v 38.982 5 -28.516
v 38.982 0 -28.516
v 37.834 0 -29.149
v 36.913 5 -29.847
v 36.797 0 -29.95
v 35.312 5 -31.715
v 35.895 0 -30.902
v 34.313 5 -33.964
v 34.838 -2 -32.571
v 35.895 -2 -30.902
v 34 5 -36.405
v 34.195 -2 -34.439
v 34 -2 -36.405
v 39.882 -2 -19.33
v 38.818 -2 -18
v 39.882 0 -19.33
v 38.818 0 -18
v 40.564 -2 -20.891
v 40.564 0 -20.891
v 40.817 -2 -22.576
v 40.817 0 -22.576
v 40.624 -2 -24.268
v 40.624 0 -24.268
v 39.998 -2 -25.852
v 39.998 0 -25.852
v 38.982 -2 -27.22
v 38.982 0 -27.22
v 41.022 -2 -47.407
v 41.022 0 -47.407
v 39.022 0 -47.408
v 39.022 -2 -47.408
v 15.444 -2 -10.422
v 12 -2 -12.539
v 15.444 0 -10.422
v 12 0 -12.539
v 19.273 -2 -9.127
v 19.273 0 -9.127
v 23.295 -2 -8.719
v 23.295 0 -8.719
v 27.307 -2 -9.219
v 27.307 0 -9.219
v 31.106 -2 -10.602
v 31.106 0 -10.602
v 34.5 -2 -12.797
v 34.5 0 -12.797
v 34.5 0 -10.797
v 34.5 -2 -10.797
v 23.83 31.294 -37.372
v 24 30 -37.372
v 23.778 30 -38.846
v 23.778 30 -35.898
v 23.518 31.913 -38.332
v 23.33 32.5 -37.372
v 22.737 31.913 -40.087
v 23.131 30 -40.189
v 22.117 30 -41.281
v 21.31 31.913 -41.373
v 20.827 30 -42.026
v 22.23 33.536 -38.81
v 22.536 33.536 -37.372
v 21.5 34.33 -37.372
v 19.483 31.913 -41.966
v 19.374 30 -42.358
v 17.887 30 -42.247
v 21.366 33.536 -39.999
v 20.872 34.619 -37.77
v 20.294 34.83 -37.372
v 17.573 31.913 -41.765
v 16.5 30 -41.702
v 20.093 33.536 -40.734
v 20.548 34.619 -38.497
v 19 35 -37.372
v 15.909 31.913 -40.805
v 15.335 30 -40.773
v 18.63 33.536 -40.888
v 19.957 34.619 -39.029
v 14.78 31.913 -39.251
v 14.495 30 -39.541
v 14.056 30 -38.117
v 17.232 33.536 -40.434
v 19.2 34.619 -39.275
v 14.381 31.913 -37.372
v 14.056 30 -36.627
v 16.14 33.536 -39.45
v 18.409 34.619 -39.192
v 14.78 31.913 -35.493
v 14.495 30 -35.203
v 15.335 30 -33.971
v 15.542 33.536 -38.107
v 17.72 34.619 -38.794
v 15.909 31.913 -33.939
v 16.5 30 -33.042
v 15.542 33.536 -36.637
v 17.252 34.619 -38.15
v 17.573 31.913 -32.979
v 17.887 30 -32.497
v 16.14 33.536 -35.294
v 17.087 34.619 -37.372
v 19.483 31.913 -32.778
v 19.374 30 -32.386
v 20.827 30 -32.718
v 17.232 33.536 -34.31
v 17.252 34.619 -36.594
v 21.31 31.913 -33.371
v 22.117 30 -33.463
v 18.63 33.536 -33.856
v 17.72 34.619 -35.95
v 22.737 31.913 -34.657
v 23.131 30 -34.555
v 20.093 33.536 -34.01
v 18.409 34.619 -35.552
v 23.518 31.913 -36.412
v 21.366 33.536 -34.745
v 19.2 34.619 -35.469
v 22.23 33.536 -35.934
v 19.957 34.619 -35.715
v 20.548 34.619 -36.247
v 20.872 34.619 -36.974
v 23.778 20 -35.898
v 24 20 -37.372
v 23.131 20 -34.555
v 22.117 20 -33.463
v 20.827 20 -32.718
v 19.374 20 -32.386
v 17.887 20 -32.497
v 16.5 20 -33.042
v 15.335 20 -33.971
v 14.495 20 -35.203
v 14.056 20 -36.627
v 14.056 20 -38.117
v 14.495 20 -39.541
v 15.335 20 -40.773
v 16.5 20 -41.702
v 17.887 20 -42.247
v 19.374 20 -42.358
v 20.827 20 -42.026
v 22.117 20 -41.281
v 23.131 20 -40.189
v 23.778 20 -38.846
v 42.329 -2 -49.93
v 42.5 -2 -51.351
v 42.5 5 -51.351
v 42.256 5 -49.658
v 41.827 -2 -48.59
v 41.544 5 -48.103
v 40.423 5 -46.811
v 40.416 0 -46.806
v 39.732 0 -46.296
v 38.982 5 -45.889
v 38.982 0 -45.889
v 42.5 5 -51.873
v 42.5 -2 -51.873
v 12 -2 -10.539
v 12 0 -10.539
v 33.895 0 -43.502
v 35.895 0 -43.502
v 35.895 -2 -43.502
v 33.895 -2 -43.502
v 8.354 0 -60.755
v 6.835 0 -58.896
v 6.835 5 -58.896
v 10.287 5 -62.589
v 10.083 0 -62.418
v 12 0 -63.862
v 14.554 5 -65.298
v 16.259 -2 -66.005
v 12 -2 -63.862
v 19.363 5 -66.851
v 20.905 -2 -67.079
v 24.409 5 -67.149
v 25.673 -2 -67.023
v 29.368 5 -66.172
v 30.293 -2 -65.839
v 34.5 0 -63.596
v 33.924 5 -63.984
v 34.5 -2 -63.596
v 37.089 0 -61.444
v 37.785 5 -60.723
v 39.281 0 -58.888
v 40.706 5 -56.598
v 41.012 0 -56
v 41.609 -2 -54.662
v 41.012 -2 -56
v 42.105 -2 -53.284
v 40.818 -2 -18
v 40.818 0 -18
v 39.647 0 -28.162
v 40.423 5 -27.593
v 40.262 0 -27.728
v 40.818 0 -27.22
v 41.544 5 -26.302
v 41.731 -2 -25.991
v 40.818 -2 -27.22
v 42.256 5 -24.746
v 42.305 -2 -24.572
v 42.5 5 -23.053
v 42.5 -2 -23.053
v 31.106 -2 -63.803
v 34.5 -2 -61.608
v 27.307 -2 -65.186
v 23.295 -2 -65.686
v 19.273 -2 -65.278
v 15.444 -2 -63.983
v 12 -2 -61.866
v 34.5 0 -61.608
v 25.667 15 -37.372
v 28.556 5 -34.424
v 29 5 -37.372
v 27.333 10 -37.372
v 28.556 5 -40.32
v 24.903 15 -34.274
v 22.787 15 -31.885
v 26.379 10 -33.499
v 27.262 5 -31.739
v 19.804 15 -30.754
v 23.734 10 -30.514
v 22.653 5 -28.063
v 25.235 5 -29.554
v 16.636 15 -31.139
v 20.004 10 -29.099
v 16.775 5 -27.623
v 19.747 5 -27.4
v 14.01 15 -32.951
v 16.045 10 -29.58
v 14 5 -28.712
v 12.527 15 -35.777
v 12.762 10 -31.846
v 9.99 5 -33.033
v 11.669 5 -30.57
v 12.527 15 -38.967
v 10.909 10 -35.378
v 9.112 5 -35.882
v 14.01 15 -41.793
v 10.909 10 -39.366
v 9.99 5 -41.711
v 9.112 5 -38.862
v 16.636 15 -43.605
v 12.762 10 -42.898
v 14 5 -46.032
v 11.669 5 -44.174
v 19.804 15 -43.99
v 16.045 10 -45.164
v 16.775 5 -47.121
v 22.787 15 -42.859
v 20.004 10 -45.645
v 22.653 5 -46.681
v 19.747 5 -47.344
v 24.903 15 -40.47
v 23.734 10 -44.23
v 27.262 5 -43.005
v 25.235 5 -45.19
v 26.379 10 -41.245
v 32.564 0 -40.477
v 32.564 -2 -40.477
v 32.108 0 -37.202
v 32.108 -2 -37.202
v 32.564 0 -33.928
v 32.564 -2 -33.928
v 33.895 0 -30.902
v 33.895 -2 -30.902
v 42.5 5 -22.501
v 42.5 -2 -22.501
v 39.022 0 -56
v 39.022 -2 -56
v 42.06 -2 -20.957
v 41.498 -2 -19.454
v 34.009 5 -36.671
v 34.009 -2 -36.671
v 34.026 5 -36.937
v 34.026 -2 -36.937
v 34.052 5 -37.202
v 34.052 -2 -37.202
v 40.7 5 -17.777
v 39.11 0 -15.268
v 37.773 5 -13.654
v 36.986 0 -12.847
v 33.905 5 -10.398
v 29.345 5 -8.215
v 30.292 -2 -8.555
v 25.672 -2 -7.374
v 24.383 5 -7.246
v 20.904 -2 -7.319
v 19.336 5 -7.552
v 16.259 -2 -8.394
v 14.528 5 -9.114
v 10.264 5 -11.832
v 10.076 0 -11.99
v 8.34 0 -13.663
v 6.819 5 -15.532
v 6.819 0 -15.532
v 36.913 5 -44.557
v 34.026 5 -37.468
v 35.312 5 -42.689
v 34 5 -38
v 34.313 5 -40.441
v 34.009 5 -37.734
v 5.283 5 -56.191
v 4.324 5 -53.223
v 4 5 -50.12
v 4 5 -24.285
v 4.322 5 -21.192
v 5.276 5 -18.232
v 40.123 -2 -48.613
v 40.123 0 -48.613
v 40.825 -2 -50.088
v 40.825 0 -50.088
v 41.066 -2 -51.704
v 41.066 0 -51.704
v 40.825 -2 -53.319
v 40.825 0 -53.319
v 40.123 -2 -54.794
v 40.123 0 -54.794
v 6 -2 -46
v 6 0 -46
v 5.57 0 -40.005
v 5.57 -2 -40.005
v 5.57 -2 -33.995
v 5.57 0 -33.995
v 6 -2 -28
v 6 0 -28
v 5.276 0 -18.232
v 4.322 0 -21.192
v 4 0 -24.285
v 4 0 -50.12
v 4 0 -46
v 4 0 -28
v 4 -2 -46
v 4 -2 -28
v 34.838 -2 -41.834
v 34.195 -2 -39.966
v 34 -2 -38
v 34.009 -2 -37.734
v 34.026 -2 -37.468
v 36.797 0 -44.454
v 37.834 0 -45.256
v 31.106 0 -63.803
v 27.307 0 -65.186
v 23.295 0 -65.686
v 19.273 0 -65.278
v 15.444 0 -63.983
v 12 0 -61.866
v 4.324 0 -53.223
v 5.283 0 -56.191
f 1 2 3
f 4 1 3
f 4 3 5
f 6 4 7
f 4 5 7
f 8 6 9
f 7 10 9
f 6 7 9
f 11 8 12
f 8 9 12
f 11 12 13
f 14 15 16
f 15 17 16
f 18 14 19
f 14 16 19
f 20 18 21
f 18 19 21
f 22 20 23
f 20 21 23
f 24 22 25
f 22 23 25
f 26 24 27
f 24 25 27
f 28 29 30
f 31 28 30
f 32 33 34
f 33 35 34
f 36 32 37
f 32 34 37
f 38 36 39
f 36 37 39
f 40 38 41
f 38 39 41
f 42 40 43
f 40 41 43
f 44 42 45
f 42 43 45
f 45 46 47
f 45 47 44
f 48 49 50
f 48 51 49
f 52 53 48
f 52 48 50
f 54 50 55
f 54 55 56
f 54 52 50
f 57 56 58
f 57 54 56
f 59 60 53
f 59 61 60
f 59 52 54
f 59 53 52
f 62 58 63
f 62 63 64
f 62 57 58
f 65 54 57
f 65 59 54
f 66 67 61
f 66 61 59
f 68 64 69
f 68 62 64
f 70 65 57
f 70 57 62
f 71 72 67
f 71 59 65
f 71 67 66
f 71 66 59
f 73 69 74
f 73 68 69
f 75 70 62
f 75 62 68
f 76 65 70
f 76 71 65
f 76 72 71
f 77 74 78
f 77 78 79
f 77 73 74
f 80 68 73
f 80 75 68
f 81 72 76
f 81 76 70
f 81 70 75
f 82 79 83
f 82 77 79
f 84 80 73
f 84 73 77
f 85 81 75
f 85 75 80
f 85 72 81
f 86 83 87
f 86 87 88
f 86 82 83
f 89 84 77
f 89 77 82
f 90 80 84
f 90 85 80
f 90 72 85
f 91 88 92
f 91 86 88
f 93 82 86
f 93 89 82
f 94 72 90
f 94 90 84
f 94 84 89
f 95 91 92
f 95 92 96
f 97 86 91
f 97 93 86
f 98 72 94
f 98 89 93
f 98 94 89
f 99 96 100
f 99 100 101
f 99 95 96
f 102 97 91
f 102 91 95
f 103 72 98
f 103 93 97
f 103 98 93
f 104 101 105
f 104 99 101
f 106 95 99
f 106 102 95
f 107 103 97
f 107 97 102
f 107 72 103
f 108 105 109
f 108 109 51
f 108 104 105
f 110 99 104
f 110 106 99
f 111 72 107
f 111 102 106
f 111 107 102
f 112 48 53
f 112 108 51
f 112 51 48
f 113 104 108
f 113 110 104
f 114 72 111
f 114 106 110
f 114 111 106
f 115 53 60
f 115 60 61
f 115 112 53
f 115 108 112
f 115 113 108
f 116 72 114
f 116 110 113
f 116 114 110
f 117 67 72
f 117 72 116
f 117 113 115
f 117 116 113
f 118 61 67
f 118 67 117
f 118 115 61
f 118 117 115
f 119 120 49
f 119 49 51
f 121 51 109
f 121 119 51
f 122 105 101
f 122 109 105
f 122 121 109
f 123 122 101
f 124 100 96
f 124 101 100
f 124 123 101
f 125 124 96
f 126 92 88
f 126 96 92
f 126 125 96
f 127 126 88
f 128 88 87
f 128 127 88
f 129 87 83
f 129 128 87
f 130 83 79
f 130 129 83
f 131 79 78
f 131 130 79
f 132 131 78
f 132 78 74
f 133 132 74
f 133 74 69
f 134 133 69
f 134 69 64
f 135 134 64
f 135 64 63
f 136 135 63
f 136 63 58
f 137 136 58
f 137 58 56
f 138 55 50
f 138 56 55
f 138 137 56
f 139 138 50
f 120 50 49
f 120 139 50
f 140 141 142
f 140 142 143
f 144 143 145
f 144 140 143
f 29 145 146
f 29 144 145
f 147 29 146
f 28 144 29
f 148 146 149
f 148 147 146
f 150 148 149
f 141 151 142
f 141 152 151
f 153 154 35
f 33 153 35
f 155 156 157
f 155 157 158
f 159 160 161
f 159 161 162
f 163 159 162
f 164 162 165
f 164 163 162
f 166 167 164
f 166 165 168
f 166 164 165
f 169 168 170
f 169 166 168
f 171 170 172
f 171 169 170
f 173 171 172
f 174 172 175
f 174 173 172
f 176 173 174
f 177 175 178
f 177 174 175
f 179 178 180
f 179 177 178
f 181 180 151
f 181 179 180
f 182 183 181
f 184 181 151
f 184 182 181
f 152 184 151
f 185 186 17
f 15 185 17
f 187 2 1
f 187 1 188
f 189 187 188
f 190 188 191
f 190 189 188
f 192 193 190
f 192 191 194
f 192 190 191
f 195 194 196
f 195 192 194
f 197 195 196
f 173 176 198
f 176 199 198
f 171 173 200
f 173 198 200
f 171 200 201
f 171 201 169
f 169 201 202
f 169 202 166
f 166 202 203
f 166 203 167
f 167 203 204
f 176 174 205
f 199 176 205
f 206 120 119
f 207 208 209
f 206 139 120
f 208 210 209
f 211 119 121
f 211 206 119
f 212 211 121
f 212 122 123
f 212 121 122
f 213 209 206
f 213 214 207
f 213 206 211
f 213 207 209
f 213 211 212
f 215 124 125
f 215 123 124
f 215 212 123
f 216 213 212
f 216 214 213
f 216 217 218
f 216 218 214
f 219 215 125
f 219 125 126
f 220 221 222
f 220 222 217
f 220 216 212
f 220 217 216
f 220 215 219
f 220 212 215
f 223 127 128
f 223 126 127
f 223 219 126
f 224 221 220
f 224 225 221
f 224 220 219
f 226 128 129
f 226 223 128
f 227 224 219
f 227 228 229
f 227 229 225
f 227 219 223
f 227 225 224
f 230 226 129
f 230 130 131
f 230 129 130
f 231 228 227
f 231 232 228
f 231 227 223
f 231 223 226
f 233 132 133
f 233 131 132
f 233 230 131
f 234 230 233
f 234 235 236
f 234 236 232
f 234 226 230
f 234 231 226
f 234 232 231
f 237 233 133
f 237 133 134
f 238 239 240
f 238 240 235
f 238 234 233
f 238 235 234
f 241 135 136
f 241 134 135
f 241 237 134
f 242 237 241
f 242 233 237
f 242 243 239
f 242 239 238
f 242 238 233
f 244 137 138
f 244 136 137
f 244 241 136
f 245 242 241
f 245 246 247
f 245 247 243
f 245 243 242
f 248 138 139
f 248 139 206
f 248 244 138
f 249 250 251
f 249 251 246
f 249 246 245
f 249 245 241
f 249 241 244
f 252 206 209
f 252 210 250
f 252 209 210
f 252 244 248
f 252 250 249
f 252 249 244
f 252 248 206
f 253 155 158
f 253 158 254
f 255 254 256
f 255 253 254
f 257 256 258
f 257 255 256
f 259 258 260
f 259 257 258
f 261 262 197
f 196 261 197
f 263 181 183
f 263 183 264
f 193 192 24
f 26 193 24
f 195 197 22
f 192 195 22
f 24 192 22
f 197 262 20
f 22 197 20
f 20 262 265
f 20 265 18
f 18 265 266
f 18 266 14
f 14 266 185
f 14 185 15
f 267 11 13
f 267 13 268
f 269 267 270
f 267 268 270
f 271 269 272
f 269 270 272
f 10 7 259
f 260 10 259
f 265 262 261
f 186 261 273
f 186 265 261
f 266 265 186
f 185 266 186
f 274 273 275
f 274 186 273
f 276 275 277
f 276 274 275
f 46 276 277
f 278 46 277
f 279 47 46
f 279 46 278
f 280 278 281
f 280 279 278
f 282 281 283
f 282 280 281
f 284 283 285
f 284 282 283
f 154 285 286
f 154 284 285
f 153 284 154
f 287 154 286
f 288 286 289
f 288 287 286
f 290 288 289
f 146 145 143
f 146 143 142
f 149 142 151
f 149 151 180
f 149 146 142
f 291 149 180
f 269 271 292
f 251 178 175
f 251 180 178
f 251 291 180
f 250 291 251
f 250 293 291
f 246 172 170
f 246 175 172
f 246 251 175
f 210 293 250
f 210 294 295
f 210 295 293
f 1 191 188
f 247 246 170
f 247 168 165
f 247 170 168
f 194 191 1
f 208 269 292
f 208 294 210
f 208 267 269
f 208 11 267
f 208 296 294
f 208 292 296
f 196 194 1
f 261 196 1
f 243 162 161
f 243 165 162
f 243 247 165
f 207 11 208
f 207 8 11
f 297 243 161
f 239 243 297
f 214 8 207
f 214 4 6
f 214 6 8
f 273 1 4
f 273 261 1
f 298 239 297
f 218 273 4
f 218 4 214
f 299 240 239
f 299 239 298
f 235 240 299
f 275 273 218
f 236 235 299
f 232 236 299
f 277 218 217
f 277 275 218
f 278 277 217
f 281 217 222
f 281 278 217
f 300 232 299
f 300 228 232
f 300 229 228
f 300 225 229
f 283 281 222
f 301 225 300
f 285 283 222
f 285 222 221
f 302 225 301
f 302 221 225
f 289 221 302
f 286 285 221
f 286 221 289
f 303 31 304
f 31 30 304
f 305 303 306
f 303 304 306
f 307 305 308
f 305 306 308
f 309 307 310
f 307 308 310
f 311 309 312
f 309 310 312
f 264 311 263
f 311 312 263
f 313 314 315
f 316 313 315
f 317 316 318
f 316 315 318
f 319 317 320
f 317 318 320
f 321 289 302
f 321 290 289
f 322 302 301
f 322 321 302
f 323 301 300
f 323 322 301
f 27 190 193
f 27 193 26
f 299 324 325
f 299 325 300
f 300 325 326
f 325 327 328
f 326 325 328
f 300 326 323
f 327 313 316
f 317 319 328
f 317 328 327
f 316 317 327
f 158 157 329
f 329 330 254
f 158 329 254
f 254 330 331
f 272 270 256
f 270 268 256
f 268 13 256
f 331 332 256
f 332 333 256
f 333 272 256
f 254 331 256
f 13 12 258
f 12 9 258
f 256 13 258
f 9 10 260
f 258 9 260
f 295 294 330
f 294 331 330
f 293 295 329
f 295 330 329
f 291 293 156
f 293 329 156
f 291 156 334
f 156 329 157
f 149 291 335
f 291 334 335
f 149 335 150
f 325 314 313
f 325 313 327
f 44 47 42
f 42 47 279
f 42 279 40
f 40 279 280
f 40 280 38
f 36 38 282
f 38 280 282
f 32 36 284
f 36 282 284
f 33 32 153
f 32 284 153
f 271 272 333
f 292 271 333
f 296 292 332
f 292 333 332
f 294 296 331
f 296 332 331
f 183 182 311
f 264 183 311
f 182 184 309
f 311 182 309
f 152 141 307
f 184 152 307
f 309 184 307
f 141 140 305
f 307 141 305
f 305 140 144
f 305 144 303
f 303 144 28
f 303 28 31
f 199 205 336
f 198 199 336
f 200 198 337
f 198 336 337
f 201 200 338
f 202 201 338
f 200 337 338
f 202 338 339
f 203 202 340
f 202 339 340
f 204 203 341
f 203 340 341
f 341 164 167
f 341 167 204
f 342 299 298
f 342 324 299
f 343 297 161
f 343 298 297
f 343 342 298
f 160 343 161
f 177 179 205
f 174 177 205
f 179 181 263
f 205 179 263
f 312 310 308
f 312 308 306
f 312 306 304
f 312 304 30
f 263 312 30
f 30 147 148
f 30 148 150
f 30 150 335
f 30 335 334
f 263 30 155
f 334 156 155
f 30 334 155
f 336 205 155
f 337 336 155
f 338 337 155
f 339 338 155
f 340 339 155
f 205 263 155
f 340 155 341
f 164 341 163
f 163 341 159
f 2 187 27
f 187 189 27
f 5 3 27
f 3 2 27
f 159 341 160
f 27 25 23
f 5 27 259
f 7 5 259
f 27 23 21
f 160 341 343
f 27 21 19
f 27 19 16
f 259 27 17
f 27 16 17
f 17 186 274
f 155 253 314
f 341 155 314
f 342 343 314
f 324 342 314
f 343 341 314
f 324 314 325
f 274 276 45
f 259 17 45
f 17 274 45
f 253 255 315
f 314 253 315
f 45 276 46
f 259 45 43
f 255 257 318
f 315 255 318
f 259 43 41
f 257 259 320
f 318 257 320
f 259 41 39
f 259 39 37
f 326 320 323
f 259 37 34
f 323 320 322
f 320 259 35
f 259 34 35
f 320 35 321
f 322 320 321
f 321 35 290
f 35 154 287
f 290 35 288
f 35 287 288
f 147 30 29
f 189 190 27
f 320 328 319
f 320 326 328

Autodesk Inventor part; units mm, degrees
ref_plane "YZ Plane" through (0, 0, 0) normal (1, 0, 0) x (0, 1, 0)
ref_plane "XZ Plane" through (0, 0, 0) normal (0, 1, 0) x (-1, 0, 0)
sketch "Szkic1" plane through (0, 0, 0) normal (0, 1, 0) x (-1, 0, 0)
  line L0 (-4, -50.1202) -> (-4, -37.2024)
  line L1 (-42.5, -51.8732) -> (-42.5, -51.3513)
  line L2 (-4, -38) -> (-4, -50.1202)
  arc A0 (-38.9822, -45.8888) -> (-34, -38.0004) centre (-42.4987, -38.1503) ccw
  line L3 (-42.5, -51.3513) -> (-42.5, -51.8732)
  arc A1 (-34, -38.0004) -> (-34.0517, -37.2023) centre (-42.4987, -38.1503) ccw
  arc A2 (-38.9822, -45.8888) -> (-42.5, -51.3513) centre (-36.5, -51.3513) ccw
  arc A3 (-42.5, -51.8732) -> (-6.8354, -58.8964) centre (-23.0549, -47.1948) ccw
  arc A4 (-6.8354, -58.8964) -> (-4, -50.1202) centre (-19, -50.1202) ccw
  line L4 (-42.5, -51.3513) -> (-42.5, -51.8732)
  line L5 (-4, -24.2847) -> (-4, -37.2024)
  line L6 (-42.5, -22.5011) -> (-42.5, -23.0533)
  line L7 (-4, -36.4049) -> (-4, -24.2847)
  arc A5 (-34, -36.4047) -> (-38.9822, -28.5157) centre (-42.4987, -36.2542) ccw
  line L8 (-42.5, -23.0533) -> (-42.5, -22.5011)
  arc A6 (-34.0517, -37.2023) -> (-34, -36.4047) centre (-42.4987, -36.2542) ccw
  arc A7 (-42.5, -23.0533) -> (-38.9822, -28.5157) centre (-36.5, -23.0533) ccw
  arc A8 (-6.8187, -15.5316) -> (-42.5, -22.5011) centre (-23.0604, -27.2024) ccw
  arc A9 (-4, -24.2847) -> (-6.8187, -15.5316) centre (-19, -24.2847) ccw
  line L9 (-42.5, -23.0533) -> (-42.5, -22.5011)
  line L10 (-12, -10.5391) -> (-12, -12.5391)
  line L11 (-34.5, -10.7971) -> (-34.5, -12.7971)
  arc A10 (-12, -12.5391) -> (-34.5, -12.7971) centre (-23.0889, -26.7178) ccw
  line L12 (-11.9997, -63.8616) -> (-11.9997, -61.8657)
  line L13 (-34.5004, -63.596) -> (-34.5004, -61.6077)
  arc A11 (-34.5004, -61.6077) -> (-11.9997, -61.8657) centre (-23.0889, -47.6872) ccw
  line L14 (-35.8952, -43.5023) -> (-33.8952, -43.5023)
  line L15 (-35.8952, -30.9023) -> (-33.8952, -30.9023)
  arc A12 (-33.8952, -43.5023) -> (-33.8952, -30.9023) centre (-44.1084, -37.2023) ccw
  line L16 (-4, -28) -> (-6, -28)
  line L17 (-6, -46) -> (-4, -46)
  arc A13 (-6, -46) -> (-6, -28) centre (-89.405, -37) ccw
  line L18 (-40.8175, -18) -> (-38.8175, -18)
  line L19 (-40.8176, -27.2196) -> (-38.8176, -27.2198)
  arc A14 (-38.8175, -18) -> (-38.9822, -27.2198) centre (-34.316, -22.6918) ccw
  line L20 (-41.0122, -56.0002) -> (-39.0216, -56.0002)
  line L21 (-39.0216, -56.0002) -> (-41.0122, -56.0002)
  line L22 (-41.0216, -47.4073) -> (-39.0216, -47.4076)
  arc A15 (-39.0216, -47.4076) -> (-39.0216, -56.0002) centre (-35.5308, -51.7039) ccw
  line L23 (-19, -7.6189) -> (11, -7.6189) construction
  point P0 (0, 0)
  point P1 (-42.5001, -29.6503)
  point P2 (-4, -22.2491)
  point P3 (-23.0549, -67.1948)
  point P4 (-23.0549, -67.1948)
  point P5 (-42.5, -44.7542)
  point P6 (-23.0604, -7.2024)
  point P7 (-23.0604, -7.2024)
  dimension "d12" = 15
  dimension "d13" = 30
  dimension "d14" = 6
  dimension "d15" = 20
  dimension "d21" = 38.5
  dimension "d53" = 2
extrude "Wyciągnięcie proste1" add sketch "Szkic1" along normal blind 5
extrude "Wyciągnięcie proste2" add sketch "Szkic1" against normal blind 2 contours L17 A13 L16 L5 L0 | A3 L13 A11 L12 | A3 L1 A2 L22 A15 L20 | L10 A10 L11 A8 | L18 A14 L19 A7 L6 A8 | A0 A1 A6 A5 L15 A12 L14
sketch "Szkic5" plane through (0, 5, 0) normal (0, 1, 0) x (1, 0, 0)
  line L0 (4, 28) -> (6, 28) projected
  arc A0 (6, 46) -> (6, 28) centre (89.405, 37) ccw projected
  line L1 (6, 46) -> (4, 46) projected
  line L2 (4, 50.1202) -> (4, 46) projected
  arc A1 (6.8354, 58.8964) -> (4, 50.1202) centre (19, 50.1202) ccw projected
  arc A2 (11.9997, 63.8616) -> (6.8354, 58.8964) centre (23.0549, 47.1948) ccw projected
  line L3 (11.9997, 63.8616) -> (11.9997, 61.8657) projected
  arc A3 (34.5004, 61.6077) -> (11.9997, 61.8657) centre (23.0889, 47.6872) ccw projected
  line L4 (34.5004, 61.6077) -> (34.5004, 63.596) projected
  arc A4 (41.0122, 56.0002) -> (34.5004, 63.596) centre (23.0549, 47.1948) ccw projected
  line L5 (41.0122, 56.0002) -> (39.0216, 56.0002) projected
  arc A5 (39.0216, 47.4076) -> (39.0216, 56.0002) centre (35.5308, 51.7039) ccw projected
  line L6 (39.0216, 47.4076) -> (41.0216, 47.4073) projected
  arc A6 (38.9822, 45.8888) -> (41.0216, 47.4073) centre (36.5, 51.3513) ccw projected
  arc A7 (38.9822, 45.8888) -> (35.8952, 43.5023) centre (42.4987, 38.1503) ccw projected
  line L7 (35.8952, 43.5023) -> (33.8952, 43.5023) projected
  arc A8 (33.8952, 43.5023) -> (33.8952, 30.9023) centre (44.1084, 37.2023) ccw projected
  line L8 (33.8952, 30.9023) -> (35.8952, 30.9023) projected
  arc A9 (35.8952, 30.9023) -> (38.9822, 28.5157) centre (42.4987, 36.2542) ccw projected
  arc A10 (40.8176, 27.2196) -> (38.9822, 28.5157) centre (36.5, 23.0533) ccw projected
  line L9 (40.8176, 27.2196) -> (38.9822, 27.2198) projected
  arc A11 (38.8175, 18) -> (38.9822, 27.2198) centre (34.316, 22.6918) ccw projected
  line L10 (38.8175, 18) -> (40.8175, 18) projected
  arc A12 (34.5, 10.7971) -> (40.8175, 18) centre (23.0604, 27.2024) ccw projected
  line L11 (34.5, 10.7971) -> (34.5, 12.7971) projected
  arc A13 (12, 12.5391) -> (34.5, 12.7971) centre (23.0889, 26.7178) ccw projected
  line L12 (12, 12.5391) -> (12, 10.5391) projected
  arc A14 (6.8187, 15.5316) -> (12, 10.5391) centre (23.0604, 27.2024) ccw projected
  arc A15 (4, 24.2847) -> (6.8187, 15.5316) centre (19, 24.2847) ccw projected
  line L13 (4, 28) -> (4, 24.2847) projected
  arc A16 (12, 10.5391) -> (34.5, 10.7971) centre (23.0604, 27.2024) ccw projected
  arc A17 (34.5004, 63.596) -> (11.9997, 63.8616) centre (23.0549, 47.1948) ccw projected
  line L14 (4, 28) -> (4, 46) projected
  arc A18 (40.8175, 18) -> (42.5, 22.5011) centre (23.0604, 27.2024) ccw projected
  arc A19 (42.5, 23.0533) -> (40.8176, 27.2196) centre (36.5, 23.0533) ccw projected
  line L15 (42.5, 23.0533) -> (42.5, 22.5011) projected
  arc A20 (34.0517, 37.2023) -> (35.8952, 30.9023) centre (42.4987, 36.2542) ccw projected
  arc A21 (35.8952, 43.5023) -> (34.0517, 37.2023) centre (42.4987, 38.1503) ccw projected
  arc A22 (42.5, 51.8732) -> (41.0122, 56.0002) centre (23.0549, 47.1948) ccw projected
  line L16 (42.5, 51.8732) -> (42.5, 51.3513) projected
  arc A23 (41.0216, 47.4073) -> (42.5, 51.3513) centre (36.5, 51.3513) ccw projected
  arc A24 (6.8187, 15.5316) -> (42.5, 22.5011) centre (23.0604, 27.2024) ccw projected
  line L17 (20.4612, 7.372) -> (50.4612, 7.372) construction
  line L18 (4, 50.1202) -> (4, 24.2847) projected
  circle A25 centre (19, 37.372) radius 10
  dimension "d74" = 20
ref_plane "Płaszczyzna konstrukcyjna1" through (0, 20, 0) normal (0, 1, 0) x (1, 0, 0)
sketch "Szkic6" plane through (0, 20, 0) normal (0, 1, 0) x (1, 0, 0)
  circle A0 centre (19, 37.372) radius 5
  point P0 (0, 0)
  dimension "d76" = 10
loft "Wyciągnięcie złożone1" add profiles "Szkic6", "Szkic5" contours all / A25
sketch "Szkic7" plane through (19, 20, -37.372) normal (0, 1, 0) x (1, 0, 0)
  circle A0 centre (0, 0) radius 5
  point P0 (-19, -37.372)
  dimension "d85" = 10
extrude "Wyciągnięcie proste3" add sketch "Szkic7" along normal blind 15
fillet "Zaokrąglenie1" radius 5 1 edges at (14, 35, -37.372)
properties part number "1" material "Tytan 6Al-4V"
